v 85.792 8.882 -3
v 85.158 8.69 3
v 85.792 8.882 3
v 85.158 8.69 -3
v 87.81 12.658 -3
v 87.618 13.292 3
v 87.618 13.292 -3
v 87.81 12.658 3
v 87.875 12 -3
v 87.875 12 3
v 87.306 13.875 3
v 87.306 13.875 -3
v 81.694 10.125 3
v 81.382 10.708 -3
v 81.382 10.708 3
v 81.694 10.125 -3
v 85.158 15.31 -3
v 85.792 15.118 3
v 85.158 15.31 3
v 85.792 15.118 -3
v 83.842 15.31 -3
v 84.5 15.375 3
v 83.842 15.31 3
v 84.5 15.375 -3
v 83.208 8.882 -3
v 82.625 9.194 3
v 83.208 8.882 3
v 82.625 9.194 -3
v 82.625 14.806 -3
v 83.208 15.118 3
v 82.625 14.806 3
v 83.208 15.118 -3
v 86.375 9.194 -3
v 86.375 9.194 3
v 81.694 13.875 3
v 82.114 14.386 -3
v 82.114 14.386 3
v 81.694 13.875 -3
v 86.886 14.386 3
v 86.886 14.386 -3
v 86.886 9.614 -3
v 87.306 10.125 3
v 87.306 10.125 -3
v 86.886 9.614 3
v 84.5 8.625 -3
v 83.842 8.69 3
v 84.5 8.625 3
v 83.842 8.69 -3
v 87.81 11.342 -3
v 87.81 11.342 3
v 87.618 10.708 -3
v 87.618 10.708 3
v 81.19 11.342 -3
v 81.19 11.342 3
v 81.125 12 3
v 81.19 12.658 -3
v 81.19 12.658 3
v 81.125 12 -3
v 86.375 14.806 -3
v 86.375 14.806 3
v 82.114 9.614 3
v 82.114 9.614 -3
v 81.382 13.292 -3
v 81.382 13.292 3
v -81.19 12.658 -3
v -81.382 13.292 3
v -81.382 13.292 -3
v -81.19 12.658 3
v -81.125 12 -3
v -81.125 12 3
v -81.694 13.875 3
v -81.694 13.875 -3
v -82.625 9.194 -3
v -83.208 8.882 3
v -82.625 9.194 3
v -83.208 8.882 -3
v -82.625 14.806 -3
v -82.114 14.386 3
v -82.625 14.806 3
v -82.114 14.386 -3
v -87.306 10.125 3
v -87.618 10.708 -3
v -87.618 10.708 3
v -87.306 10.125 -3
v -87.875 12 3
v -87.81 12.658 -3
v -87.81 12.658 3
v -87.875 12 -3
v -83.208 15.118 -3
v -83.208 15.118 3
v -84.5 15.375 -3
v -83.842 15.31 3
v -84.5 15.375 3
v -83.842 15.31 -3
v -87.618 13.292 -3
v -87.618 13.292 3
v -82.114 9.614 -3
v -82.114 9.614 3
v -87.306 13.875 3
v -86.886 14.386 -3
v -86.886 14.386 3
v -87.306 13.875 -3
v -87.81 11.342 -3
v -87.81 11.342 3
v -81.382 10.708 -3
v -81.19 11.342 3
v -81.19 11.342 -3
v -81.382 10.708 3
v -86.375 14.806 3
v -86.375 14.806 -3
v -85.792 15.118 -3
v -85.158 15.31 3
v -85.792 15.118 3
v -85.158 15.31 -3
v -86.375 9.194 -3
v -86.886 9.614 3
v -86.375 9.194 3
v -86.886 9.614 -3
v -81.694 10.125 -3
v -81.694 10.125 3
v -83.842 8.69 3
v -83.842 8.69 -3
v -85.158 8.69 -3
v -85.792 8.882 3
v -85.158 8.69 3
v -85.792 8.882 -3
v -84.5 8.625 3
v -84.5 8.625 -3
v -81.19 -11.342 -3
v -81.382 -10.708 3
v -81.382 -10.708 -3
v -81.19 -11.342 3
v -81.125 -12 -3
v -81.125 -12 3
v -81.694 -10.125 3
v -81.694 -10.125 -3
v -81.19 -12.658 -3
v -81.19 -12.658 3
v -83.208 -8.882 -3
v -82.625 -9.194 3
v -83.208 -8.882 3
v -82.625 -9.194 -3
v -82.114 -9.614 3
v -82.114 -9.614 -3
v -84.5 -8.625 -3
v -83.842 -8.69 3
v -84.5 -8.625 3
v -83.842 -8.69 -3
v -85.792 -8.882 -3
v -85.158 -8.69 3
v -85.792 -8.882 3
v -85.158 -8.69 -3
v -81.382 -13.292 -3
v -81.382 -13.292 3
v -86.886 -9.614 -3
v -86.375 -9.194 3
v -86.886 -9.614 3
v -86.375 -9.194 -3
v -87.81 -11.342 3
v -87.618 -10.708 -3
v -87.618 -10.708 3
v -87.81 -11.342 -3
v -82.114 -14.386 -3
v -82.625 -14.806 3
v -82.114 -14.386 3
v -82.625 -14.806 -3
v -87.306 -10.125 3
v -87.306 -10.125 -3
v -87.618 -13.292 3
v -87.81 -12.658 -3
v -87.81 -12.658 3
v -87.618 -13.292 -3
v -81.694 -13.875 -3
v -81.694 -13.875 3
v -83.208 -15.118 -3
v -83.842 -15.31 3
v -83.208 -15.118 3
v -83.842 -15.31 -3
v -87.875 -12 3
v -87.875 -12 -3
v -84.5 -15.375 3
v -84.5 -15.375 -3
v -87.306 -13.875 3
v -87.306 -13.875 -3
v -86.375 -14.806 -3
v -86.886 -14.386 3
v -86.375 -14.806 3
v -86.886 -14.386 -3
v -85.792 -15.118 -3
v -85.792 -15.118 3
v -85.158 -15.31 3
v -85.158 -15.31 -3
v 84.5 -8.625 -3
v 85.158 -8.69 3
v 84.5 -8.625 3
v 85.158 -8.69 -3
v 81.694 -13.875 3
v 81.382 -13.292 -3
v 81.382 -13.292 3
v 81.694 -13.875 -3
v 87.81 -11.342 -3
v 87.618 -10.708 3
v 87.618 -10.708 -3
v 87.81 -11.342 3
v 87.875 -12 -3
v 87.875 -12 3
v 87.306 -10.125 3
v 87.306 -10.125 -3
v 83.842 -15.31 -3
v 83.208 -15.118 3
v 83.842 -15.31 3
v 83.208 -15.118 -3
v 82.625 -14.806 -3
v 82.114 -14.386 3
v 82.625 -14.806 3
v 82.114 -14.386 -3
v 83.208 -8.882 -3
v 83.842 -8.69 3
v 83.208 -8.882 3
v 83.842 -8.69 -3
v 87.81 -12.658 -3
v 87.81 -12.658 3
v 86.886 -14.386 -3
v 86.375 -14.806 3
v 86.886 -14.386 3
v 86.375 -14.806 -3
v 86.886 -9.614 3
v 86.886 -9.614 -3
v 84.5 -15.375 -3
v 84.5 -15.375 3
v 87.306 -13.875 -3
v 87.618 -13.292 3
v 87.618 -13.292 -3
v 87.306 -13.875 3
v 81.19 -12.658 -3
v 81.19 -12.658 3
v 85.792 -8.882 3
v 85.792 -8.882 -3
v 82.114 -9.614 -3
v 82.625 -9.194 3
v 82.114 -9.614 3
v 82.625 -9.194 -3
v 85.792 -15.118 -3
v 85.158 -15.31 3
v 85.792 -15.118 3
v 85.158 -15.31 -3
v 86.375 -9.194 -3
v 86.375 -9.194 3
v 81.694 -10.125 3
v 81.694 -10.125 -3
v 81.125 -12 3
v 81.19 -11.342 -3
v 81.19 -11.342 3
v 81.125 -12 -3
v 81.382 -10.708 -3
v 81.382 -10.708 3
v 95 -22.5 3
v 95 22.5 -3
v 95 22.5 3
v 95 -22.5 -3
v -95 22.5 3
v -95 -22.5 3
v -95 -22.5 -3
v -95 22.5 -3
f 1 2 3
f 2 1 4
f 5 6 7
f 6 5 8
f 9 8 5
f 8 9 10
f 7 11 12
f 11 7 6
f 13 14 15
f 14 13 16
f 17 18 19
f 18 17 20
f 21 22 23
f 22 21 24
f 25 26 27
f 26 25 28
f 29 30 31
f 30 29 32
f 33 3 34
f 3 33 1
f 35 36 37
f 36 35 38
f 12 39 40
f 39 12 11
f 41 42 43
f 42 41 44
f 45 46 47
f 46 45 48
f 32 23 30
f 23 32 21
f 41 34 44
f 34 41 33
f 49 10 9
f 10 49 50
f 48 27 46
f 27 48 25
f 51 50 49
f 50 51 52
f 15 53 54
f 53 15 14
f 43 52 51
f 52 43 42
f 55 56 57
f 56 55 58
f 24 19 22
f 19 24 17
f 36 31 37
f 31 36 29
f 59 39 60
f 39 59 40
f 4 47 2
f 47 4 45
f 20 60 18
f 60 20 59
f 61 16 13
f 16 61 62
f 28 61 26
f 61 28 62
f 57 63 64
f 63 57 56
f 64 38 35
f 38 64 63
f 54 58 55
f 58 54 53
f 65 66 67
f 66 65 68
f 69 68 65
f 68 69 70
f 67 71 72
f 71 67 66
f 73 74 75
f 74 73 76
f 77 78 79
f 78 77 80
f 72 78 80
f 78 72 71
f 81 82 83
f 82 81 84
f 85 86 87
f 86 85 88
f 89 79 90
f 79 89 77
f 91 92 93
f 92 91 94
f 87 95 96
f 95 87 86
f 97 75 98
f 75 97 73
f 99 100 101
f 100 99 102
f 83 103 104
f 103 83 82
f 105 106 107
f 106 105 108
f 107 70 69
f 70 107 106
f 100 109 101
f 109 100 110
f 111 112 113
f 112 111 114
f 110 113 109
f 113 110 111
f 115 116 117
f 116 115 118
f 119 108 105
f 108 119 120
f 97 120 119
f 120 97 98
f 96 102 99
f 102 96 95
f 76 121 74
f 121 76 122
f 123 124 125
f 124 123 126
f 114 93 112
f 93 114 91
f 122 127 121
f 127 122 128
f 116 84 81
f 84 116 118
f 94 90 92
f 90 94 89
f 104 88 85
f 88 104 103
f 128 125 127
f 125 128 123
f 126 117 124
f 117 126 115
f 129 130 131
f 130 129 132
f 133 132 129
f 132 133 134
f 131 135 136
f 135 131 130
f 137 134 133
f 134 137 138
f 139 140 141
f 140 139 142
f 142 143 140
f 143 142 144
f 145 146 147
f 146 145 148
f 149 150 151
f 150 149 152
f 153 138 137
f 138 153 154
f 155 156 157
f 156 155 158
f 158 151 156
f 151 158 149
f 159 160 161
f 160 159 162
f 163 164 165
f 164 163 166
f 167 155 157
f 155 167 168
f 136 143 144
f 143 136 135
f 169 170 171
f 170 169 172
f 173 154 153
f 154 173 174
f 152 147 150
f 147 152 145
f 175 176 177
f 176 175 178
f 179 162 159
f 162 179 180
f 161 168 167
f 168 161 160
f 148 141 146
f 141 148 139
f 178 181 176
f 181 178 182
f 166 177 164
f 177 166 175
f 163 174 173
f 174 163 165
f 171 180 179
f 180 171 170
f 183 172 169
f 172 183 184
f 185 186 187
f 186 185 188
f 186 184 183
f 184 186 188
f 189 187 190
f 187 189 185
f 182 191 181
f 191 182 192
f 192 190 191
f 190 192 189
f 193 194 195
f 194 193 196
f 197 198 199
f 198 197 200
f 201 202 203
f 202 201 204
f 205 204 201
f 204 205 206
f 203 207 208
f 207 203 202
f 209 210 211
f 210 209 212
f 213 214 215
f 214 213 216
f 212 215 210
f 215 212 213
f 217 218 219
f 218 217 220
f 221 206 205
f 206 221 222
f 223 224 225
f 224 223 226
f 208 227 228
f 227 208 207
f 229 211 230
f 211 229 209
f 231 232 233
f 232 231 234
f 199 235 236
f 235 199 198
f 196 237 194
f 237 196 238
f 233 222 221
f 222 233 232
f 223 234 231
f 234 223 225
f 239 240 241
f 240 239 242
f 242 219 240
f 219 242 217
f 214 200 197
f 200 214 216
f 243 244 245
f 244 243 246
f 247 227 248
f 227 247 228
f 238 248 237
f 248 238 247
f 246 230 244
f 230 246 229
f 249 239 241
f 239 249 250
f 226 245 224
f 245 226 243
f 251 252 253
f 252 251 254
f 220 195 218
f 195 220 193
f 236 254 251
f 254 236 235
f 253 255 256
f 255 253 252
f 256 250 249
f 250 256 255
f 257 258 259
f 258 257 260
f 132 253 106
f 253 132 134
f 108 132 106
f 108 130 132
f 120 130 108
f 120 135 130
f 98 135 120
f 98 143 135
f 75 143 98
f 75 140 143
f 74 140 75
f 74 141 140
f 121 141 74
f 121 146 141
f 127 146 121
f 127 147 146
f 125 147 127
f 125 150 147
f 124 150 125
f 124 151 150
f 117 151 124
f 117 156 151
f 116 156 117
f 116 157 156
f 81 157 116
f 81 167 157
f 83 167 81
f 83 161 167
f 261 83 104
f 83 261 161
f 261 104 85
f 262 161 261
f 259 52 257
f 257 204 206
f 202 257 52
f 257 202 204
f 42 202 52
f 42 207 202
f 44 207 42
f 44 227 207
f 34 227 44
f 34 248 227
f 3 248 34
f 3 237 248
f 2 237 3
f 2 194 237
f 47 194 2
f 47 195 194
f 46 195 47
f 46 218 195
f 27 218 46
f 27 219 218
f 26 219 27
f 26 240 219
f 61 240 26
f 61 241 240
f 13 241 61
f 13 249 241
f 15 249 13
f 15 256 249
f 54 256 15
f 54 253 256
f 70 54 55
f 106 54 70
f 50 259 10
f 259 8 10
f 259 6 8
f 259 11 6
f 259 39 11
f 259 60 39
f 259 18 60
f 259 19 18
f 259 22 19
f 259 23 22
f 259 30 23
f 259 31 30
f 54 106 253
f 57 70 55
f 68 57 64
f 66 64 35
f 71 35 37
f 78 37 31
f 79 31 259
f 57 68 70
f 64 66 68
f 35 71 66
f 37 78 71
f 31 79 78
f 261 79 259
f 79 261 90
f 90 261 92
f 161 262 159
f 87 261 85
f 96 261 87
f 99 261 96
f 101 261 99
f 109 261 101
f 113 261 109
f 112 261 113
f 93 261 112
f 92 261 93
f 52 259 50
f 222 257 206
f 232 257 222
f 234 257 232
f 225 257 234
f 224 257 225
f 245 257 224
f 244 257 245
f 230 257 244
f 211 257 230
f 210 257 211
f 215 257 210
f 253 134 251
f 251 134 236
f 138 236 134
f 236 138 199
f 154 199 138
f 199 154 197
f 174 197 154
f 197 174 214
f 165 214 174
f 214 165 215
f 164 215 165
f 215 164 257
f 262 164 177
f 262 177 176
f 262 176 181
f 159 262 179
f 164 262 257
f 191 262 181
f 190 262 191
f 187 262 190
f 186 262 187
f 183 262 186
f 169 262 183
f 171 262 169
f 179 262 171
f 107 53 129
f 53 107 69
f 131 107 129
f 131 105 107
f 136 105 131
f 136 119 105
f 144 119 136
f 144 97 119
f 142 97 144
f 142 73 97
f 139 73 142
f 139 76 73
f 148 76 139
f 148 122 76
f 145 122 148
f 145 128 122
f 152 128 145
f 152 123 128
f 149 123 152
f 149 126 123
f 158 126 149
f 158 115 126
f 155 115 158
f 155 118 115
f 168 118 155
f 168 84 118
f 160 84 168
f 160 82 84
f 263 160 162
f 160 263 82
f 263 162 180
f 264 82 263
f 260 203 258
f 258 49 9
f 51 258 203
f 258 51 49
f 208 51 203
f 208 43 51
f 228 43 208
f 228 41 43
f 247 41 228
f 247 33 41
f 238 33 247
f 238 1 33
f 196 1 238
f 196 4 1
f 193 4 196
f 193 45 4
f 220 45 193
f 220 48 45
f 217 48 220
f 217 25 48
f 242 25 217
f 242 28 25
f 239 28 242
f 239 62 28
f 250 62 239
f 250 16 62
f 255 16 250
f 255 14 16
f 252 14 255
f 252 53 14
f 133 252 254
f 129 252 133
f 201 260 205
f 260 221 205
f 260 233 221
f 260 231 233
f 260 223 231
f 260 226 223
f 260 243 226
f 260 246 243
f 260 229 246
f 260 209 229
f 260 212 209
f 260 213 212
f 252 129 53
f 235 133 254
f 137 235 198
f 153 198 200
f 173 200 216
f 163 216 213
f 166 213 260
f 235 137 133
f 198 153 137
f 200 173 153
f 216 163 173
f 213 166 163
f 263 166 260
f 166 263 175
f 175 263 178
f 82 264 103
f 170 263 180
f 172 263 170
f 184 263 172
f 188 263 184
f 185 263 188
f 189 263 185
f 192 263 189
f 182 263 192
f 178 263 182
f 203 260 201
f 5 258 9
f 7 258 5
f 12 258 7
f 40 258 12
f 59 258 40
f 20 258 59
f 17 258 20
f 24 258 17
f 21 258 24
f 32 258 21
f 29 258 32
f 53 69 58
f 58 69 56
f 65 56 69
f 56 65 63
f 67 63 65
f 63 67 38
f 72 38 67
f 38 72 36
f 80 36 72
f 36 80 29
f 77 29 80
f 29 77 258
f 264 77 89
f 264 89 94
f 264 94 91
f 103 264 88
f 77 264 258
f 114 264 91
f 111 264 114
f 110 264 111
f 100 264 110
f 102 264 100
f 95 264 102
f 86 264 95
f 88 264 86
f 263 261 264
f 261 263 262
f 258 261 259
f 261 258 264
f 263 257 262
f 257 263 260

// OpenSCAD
$fn = 32;

// ----------------------------------------------------------------------
// Corner plate 190 x 45 x 6
// 4 holes, centres taken from the edge offset
// ----------------------------------------------------------------------

// --- parameters (mm) ---
plate = [190, 45, 6];    // overall size (x, y, z)
holes = 4;               // number of holes the drawing asks for
bore_d = 6.6;            // nominal hole diameter from the drawing
print_allowance = 0.15;  // clearance added for printing
edge = 10.5;             // hole centre offset from the plate edge

// --- derived feature positions (mm) ---
hole_d = bore_d + print_allowance;  // = 6.75   hole diameter as printed
corner_x = plate[0] / 2 - edge;     // = 84.5   corner hole X
corner_y = plate[1] / 2 - edge;     // = 12   corner hole Y
feature_centers = [
  [corner_x, corner_y],
  [-corner_x, corner_y],
  [-corner_x, -corner_y],
  [corner_x, -corner_y]
];   // hole centres the loop below drills

// plate outline, every hole drilled through with the same cutters
difference() {
  cube(plate, center = true);
  for (centre = feature_centers)
    translate([centre[0], centre[1], 0])
      cylinder(d = hole_d, h = plate[2] + 2, center = true);
}
